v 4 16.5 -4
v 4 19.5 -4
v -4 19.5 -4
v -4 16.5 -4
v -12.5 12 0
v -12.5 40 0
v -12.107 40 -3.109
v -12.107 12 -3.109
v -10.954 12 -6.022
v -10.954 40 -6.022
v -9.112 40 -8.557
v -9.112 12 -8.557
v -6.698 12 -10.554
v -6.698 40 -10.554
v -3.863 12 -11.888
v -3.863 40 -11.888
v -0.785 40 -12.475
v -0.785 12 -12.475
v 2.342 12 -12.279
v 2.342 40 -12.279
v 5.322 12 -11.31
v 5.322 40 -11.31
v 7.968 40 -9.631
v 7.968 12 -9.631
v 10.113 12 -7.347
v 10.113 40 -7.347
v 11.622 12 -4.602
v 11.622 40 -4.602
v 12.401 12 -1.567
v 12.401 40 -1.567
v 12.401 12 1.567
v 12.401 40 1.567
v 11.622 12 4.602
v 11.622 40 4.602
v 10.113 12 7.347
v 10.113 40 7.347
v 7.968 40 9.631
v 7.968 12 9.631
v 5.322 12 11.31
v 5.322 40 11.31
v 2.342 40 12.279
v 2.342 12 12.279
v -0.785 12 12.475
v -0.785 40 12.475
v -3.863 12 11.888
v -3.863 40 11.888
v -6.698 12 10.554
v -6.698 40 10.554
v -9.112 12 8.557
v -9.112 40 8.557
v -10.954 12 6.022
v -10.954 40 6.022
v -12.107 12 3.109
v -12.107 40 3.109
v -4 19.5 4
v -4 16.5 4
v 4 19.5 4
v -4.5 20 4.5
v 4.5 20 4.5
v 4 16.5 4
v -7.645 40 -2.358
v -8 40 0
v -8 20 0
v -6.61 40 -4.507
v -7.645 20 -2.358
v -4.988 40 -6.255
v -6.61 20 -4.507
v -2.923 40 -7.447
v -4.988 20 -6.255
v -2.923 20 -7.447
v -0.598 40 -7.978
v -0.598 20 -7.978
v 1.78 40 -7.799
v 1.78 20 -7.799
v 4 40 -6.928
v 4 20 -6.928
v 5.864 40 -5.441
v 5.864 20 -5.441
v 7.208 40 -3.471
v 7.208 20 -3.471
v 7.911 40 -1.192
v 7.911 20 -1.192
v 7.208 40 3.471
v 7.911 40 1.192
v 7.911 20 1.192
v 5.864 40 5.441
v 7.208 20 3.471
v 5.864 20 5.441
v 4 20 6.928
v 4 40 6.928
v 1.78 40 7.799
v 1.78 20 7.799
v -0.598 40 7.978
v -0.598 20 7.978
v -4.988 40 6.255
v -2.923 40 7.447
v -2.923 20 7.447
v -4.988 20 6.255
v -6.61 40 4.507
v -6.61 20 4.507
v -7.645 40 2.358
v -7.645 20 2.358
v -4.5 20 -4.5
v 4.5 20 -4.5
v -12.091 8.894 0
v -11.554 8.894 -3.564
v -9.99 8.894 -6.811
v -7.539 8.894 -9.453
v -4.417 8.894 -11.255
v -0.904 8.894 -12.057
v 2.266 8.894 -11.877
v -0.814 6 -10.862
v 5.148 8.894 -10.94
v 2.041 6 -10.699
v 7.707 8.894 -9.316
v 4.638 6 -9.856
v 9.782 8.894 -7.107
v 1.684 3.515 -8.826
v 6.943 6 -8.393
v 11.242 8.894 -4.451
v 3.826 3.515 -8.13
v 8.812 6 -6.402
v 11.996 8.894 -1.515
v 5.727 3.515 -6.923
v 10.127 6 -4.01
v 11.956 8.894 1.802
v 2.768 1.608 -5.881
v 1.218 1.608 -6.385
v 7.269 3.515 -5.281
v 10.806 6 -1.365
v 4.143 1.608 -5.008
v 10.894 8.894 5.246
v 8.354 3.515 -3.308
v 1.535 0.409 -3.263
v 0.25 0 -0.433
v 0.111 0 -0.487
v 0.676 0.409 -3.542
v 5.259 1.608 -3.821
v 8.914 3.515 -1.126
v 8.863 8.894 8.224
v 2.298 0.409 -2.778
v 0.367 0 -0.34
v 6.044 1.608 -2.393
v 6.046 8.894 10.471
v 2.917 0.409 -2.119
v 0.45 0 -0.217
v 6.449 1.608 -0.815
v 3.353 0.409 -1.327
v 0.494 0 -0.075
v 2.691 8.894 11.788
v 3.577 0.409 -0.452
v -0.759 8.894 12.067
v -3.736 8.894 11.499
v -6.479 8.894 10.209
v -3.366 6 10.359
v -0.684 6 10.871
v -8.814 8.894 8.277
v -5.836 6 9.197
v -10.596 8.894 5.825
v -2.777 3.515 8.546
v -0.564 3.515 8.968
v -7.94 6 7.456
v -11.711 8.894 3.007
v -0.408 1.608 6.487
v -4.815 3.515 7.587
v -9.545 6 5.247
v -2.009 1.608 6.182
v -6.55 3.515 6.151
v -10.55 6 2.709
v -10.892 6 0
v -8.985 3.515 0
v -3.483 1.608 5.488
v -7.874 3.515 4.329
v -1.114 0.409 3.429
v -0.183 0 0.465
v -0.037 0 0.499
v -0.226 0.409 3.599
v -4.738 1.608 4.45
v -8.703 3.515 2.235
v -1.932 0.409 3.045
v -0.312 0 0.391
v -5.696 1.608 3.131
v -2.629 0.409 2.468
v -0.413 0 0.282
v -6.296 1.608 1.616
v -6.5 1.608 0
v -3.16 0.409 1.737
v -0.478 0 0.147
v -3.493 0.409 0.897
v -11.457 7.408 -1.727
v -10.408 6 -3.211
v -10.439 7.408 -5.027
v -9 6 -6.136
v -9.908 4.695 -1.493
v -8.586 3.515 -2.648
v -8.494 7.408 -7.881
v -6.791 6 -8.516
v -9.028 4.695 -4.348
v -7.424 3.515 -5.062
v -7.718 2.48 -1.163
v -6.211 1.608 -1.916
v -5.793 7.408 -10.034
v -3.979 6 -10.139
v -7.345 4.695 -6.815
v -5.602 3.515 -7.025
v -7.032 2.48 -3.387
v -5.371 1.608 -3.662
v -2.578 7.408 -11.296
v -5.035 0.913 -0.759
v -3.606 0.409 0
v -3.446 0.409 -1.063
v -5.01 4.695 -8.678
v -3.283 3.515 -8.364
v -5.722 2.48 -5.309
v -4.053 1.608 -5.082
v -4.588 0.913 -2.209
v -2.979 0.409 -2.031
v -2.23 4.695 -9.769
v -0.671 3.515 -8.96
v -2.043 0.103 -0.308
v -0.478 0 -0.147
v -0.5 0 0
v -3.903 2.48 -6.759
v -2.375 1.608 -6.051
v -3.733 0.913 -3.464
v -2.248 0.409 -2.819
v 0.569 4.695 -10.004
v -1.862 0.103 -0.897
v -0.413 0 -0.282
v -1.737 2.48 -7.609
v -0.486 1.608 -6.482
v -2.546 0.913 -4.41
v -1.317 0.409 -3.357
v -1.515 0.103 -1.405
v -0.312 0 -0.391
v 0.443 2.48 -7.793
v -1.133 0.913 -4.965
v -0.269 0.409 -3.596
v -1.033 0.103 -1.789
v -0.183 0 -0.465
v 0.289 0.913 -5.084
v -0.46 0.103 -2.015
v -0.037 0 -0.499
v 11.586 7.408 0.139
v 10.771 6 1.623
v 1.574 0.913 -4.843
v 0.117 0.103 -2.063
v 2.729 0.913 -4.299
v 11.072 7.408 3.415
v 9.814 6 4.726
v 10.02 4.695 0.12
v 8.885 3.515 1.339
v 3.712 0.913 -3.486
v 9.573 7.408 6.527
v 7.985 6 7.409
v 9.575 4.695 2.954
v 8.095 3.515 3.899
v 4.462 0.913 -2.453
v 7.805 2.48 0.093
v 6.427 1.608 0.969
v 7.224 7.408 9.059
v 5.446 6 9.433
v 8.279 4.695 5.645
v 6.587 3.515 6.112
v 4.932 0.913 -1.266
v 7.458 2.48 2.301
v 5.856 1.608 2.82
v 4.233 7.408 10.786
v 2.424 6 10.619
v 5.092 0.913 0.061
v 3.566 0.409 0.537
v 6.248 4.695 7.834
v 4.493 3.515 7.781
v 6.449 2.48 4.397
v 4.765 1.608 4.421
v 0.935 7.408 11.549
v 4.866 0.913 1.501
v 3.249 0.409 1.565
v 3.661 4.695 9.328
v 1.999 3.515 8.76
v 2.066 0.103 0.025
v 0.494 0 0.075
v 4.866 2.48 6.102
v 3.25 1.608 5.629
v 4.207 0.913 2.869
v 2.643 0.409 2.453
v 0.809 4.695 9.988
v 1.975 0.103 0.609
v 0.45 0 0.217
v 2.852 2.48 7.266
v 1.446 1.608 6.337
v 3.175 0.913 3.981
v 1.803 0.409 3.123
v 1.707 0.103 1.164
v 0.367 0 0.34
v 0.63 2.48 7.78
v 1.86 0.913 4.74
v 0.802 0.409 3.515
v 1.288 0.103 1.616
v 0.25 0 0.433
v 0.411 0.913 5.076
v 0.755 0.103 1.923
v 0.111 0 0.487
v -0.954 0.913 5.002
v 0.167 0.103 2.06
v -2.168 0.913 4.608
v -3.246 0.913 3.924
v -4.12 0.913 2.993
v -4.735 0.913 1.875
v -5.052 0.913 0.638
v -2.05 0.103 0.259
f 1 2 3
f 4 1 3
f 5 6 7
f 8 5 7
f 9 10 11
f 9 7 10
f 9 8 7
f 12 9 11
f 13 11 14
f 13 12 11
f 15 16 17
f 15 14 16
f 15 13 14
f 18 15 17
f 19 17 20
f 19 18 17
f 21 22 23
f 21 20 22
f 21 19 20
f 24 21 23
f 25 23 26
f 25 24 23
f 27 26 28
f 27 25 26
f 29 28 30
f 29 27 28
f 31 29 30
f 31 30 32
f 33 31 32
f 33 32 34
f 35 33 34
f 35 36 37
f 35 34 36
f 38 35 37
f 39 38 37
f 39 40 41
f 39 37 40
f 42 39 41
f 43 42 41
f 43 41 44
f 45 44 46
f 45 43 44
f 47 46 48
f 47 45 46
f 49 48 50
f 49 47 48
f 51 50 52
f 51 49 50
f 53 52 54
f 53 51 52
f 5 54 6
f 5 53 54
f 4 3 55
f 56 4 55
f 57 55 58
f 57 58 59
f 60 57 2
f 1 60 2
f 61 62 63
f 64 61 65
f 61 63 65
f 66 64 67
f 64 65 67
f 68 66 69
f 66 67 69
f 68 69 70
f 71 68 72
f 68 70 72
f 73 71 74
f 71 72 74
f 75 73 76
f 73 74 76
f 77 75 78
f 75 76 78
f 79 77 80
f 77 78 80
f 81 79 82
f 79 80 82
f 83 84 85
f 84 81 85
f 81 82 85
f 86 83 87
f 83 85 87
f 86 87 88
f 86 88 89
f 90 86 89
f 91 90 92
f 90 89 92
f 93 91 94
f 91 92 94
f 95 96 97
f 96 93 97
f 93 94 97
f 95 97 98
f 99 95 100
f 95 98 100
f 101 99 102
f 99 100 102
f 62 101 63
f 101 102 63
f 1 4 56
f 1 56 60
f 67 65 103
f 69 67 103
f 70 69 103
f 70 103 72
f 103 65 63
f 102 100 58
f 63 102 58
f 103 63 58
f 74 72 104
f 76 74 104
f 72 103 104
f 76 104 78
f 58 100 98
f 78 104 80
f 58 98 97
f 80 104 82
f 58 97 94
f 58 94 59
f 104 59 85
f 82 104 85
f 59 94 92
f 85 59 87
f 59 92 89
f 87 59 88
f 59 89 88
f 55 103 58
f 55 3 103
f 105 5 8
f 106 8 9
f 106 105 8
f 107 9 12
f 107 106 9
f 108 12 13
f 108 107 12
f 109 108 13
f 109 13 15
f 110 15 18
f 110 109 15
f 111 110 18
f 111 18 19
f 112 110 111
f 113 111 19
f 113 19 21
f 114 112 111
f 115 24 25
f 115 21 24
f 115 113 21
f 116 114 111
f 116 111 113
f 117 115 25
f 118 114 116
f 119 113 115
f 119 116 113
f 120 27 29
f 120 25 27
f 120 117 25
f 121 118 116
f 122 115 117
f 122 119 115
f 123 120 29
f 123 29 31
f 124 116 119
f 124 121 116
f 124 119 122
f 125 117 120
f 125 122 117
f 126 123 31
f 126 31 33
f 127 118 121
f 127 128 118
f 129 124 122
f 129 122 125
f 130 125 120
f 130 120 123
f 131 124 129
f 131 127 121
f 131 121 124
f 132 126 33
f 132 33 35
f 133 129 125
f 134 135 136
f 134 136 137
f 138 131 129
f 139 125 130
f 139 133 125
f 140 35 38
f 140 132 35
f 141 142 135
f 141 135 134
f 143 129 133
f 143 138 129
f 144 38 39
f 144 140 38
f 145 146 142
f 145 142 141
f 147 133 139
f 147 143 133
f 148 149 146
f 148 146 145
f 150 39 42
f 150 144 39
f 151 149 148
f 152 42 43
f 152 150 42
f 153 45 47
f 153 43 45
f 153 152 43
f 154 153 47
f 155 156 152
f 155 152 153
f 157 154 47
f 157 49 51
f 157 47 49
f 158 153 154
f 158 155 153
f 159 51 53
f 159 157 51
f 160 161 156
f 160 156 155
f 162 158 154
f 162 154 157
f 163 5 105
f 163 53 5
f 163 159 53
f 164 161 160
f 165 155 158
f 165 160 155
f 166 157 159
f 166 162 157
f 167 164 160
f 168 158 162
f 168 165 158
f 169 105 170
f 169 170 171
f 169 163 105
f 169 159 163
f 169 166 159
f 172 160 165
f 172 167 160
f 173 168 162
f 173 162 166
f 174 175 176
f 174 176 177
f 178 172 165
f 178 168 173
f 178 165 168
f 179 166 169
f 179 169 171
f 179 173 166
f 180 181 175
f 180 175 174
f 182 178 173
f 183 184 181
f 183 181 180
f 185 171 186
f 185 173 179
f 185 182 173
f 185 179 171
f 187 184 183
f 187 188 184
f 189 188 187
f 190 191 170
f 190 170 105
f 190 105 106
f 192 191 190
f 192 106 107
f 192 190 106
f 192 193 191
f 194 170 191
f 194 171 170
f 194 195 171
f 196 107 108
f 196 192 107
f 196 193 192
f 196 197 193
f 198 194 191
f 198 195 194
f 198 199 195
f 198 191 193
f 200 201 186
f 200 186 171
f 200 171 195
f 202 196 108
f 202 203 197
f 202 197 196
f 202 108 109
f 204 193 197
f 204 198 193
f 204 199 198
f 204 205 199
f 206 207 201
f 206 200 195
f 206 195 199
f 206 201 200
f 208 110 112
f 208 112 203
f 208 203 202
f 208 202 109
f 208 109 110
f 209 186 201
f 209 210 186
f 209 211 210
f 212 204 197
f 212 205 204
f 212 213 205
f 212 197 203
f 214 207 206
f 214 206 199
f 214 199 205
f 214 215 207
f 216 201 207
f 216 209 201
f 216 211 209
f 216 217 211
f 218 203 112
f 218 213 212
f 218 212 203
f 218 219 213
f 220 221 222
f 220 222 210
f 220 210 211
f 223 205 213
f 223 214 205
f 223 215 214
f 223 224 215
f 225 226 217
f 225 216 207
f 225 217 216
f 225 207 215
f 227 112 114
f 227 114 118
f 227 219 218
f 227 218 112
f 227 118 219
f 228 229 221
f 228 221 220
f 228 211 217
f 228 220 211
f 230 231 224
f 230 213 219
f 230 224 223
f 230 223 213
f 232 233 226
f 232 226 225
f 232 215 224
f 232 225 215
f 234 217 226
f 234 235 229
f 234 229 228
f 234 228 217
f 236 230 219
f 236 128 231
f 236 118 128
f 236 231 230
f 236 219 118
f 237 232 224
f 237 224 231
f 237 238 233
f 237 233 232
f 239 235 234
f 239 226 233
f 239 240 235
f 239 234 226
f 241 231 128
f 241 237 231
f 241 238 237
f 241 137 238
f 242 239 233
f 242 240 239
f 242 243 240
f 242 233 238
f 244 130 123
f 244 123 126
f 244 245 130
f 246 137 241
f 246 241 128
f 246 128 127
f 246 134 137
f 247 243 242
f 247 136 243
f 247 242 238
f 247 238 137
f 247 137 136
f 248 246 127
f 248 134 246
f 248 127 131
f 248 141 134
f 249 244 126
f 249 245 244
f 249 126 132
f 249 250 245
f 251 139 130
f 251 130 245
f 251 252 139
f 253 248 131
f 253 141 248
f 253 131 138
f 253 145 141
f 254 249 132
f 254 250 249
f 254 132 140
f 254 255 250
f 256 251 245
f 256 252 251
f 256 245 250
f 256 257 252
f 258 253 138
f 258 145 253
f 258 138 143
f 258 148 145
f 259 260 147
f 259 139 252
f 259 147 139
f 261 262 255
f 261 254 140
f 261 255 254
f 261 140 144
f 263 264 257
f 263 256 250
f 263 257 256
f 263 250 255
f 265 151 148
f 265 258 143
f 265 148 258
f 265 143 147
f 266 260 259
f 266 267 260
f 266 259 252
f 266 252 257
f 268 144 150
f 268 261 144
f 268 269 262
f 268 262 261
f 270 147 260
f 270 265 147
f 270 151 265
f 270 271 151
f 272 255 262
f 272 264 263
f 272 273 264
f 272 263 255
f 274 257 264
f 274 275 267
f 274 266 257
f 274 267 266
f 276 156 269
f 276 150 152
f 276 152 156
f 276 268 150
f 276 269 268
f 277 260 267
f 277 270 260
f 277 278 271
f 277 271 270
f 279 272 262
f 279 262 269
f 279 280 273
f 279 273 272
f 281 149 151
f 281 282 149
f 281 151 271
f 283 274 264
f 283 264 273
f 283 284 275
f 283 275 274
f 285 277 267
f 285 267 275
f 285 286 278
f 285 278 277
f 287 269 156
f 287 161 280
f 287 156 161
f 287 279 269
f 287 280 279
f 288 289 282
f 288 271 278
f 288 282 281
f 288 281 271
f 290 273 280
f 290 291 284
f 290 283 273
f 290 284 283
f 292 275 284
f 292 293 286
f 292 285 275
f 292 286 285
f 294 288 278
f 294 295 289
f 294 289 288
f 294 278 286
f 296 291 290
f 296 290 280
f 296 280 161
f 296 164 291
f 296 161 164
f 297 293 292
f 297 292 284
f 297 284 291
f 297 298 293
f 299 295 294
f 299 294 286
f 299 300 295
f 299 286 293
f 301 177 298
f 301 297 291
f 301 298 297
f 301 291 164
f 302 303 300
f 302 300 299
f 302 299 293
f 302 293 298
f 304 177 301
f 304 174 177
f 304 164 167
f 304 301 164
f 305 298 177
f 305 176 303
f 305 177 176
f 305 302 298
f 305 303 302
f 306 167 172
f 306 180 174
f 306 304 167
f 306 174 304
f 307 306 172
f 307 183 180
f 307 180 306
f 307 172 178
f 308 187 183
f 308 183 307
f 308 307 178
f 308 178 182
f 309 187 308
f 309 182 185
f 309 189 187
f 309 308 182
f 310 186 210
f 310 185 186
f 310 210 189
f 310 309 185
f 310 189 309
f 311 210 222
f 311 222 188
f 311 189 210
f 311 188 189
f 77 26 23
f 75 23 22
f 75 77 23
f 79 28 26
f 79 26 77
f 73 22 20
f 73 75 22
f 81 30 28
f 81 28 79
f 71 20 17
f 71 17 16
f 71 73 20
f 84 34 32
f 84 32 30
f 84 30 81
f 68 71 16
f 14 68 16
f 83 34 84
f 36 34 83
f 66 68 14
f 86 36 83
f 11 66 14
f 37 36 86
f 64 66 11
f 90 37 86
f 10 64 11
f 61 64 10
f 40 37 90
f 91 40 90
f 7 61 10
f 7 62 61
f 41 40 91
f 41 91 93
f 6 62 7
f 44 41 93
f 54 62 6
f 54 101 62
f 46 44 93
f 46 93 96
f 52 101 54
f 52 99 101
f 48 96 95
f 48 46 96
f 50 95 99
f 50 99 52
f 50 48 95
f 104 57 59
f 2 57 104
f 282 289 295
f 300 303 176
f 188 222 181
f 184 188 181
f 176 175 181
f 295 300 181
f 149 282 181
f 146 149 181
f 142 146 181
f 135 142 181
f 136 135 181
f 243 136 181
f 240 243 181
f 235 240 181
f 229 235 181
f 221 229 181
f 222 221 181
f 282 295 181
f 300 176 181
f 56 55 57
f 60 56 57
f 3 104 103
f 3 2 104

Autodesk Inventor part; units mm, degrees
ref_plane "YZ Plane" through (0, 0, 0) normal (1, 0, 0) x (0, 1, 0)
ref_plane "XZ Plane" through (0, 0, 0) normal (0, 1, 0) x (-1, 0, 0)
ref_plane "XY Plane" through (0, 0, 0) normal (0, 0, 1) x (1, 0, 0)
sketch "Szkic1" plane through (0, 0, 0) normal (0, 1, 0) x (-1, 0, 0)
  circle A0 centre (0, 0) radius 8
  circle A1 centre (0, 0) radius 12.5
  dimension "d0" = 16
  dimension "d1" = 25
extrude "Wyciągnięcie proste1" add sketch "Szkic1" along normal blind 40
sketch "Szkic2" plane through (0, 0, 0) normal (0, -1, 0) x (1, 0, 0)
  circle A0 centre (0, 0) radius 8 projected
  circle A1 centre (0, 0) radius 8 projected
  circle A2 centre (0, 0) radius 12.5 projected
extrude "Wyciągnięcie proste2" add sketch "Szkic2" against normal blind 20 contours A0
fillet "Zaokrąglenie1" radius 12 1 edges at (12.5, 0, 0)
sketch "Szkic3" plane through (0, 20, 0) normal (0, 1, 0) x (1, 0, 0)
  circle A0 centre (0, 0) radius 8 projected
  line L0 (-4, -4) -> (4, -4)
  line L1 (4, -4) -> (4, 4)
  line L2 (4, 4) -> (-4, 4)
  line L3 (-4, 4) -> (-4, -4)
  line L4 (-4, -4) -> (4, 4) construction
  line L5 (4, -4) -> (-4, 4) construction
  dimension "d7" = 8
  dimension "d8" = 8
extrude "Wyciągnięcie proste3" cut sketch "Szkic3" against normal blind 3.5 contours L3 L2 L1 L0
chamfer "Faza1" distance 0.5 angle 45 4 edges at (4, 20, 0) (0, 20, -4) (0, 20, 4) (-4, 20, 0)
properties part number "koncowka do laski - zaokraglona"
